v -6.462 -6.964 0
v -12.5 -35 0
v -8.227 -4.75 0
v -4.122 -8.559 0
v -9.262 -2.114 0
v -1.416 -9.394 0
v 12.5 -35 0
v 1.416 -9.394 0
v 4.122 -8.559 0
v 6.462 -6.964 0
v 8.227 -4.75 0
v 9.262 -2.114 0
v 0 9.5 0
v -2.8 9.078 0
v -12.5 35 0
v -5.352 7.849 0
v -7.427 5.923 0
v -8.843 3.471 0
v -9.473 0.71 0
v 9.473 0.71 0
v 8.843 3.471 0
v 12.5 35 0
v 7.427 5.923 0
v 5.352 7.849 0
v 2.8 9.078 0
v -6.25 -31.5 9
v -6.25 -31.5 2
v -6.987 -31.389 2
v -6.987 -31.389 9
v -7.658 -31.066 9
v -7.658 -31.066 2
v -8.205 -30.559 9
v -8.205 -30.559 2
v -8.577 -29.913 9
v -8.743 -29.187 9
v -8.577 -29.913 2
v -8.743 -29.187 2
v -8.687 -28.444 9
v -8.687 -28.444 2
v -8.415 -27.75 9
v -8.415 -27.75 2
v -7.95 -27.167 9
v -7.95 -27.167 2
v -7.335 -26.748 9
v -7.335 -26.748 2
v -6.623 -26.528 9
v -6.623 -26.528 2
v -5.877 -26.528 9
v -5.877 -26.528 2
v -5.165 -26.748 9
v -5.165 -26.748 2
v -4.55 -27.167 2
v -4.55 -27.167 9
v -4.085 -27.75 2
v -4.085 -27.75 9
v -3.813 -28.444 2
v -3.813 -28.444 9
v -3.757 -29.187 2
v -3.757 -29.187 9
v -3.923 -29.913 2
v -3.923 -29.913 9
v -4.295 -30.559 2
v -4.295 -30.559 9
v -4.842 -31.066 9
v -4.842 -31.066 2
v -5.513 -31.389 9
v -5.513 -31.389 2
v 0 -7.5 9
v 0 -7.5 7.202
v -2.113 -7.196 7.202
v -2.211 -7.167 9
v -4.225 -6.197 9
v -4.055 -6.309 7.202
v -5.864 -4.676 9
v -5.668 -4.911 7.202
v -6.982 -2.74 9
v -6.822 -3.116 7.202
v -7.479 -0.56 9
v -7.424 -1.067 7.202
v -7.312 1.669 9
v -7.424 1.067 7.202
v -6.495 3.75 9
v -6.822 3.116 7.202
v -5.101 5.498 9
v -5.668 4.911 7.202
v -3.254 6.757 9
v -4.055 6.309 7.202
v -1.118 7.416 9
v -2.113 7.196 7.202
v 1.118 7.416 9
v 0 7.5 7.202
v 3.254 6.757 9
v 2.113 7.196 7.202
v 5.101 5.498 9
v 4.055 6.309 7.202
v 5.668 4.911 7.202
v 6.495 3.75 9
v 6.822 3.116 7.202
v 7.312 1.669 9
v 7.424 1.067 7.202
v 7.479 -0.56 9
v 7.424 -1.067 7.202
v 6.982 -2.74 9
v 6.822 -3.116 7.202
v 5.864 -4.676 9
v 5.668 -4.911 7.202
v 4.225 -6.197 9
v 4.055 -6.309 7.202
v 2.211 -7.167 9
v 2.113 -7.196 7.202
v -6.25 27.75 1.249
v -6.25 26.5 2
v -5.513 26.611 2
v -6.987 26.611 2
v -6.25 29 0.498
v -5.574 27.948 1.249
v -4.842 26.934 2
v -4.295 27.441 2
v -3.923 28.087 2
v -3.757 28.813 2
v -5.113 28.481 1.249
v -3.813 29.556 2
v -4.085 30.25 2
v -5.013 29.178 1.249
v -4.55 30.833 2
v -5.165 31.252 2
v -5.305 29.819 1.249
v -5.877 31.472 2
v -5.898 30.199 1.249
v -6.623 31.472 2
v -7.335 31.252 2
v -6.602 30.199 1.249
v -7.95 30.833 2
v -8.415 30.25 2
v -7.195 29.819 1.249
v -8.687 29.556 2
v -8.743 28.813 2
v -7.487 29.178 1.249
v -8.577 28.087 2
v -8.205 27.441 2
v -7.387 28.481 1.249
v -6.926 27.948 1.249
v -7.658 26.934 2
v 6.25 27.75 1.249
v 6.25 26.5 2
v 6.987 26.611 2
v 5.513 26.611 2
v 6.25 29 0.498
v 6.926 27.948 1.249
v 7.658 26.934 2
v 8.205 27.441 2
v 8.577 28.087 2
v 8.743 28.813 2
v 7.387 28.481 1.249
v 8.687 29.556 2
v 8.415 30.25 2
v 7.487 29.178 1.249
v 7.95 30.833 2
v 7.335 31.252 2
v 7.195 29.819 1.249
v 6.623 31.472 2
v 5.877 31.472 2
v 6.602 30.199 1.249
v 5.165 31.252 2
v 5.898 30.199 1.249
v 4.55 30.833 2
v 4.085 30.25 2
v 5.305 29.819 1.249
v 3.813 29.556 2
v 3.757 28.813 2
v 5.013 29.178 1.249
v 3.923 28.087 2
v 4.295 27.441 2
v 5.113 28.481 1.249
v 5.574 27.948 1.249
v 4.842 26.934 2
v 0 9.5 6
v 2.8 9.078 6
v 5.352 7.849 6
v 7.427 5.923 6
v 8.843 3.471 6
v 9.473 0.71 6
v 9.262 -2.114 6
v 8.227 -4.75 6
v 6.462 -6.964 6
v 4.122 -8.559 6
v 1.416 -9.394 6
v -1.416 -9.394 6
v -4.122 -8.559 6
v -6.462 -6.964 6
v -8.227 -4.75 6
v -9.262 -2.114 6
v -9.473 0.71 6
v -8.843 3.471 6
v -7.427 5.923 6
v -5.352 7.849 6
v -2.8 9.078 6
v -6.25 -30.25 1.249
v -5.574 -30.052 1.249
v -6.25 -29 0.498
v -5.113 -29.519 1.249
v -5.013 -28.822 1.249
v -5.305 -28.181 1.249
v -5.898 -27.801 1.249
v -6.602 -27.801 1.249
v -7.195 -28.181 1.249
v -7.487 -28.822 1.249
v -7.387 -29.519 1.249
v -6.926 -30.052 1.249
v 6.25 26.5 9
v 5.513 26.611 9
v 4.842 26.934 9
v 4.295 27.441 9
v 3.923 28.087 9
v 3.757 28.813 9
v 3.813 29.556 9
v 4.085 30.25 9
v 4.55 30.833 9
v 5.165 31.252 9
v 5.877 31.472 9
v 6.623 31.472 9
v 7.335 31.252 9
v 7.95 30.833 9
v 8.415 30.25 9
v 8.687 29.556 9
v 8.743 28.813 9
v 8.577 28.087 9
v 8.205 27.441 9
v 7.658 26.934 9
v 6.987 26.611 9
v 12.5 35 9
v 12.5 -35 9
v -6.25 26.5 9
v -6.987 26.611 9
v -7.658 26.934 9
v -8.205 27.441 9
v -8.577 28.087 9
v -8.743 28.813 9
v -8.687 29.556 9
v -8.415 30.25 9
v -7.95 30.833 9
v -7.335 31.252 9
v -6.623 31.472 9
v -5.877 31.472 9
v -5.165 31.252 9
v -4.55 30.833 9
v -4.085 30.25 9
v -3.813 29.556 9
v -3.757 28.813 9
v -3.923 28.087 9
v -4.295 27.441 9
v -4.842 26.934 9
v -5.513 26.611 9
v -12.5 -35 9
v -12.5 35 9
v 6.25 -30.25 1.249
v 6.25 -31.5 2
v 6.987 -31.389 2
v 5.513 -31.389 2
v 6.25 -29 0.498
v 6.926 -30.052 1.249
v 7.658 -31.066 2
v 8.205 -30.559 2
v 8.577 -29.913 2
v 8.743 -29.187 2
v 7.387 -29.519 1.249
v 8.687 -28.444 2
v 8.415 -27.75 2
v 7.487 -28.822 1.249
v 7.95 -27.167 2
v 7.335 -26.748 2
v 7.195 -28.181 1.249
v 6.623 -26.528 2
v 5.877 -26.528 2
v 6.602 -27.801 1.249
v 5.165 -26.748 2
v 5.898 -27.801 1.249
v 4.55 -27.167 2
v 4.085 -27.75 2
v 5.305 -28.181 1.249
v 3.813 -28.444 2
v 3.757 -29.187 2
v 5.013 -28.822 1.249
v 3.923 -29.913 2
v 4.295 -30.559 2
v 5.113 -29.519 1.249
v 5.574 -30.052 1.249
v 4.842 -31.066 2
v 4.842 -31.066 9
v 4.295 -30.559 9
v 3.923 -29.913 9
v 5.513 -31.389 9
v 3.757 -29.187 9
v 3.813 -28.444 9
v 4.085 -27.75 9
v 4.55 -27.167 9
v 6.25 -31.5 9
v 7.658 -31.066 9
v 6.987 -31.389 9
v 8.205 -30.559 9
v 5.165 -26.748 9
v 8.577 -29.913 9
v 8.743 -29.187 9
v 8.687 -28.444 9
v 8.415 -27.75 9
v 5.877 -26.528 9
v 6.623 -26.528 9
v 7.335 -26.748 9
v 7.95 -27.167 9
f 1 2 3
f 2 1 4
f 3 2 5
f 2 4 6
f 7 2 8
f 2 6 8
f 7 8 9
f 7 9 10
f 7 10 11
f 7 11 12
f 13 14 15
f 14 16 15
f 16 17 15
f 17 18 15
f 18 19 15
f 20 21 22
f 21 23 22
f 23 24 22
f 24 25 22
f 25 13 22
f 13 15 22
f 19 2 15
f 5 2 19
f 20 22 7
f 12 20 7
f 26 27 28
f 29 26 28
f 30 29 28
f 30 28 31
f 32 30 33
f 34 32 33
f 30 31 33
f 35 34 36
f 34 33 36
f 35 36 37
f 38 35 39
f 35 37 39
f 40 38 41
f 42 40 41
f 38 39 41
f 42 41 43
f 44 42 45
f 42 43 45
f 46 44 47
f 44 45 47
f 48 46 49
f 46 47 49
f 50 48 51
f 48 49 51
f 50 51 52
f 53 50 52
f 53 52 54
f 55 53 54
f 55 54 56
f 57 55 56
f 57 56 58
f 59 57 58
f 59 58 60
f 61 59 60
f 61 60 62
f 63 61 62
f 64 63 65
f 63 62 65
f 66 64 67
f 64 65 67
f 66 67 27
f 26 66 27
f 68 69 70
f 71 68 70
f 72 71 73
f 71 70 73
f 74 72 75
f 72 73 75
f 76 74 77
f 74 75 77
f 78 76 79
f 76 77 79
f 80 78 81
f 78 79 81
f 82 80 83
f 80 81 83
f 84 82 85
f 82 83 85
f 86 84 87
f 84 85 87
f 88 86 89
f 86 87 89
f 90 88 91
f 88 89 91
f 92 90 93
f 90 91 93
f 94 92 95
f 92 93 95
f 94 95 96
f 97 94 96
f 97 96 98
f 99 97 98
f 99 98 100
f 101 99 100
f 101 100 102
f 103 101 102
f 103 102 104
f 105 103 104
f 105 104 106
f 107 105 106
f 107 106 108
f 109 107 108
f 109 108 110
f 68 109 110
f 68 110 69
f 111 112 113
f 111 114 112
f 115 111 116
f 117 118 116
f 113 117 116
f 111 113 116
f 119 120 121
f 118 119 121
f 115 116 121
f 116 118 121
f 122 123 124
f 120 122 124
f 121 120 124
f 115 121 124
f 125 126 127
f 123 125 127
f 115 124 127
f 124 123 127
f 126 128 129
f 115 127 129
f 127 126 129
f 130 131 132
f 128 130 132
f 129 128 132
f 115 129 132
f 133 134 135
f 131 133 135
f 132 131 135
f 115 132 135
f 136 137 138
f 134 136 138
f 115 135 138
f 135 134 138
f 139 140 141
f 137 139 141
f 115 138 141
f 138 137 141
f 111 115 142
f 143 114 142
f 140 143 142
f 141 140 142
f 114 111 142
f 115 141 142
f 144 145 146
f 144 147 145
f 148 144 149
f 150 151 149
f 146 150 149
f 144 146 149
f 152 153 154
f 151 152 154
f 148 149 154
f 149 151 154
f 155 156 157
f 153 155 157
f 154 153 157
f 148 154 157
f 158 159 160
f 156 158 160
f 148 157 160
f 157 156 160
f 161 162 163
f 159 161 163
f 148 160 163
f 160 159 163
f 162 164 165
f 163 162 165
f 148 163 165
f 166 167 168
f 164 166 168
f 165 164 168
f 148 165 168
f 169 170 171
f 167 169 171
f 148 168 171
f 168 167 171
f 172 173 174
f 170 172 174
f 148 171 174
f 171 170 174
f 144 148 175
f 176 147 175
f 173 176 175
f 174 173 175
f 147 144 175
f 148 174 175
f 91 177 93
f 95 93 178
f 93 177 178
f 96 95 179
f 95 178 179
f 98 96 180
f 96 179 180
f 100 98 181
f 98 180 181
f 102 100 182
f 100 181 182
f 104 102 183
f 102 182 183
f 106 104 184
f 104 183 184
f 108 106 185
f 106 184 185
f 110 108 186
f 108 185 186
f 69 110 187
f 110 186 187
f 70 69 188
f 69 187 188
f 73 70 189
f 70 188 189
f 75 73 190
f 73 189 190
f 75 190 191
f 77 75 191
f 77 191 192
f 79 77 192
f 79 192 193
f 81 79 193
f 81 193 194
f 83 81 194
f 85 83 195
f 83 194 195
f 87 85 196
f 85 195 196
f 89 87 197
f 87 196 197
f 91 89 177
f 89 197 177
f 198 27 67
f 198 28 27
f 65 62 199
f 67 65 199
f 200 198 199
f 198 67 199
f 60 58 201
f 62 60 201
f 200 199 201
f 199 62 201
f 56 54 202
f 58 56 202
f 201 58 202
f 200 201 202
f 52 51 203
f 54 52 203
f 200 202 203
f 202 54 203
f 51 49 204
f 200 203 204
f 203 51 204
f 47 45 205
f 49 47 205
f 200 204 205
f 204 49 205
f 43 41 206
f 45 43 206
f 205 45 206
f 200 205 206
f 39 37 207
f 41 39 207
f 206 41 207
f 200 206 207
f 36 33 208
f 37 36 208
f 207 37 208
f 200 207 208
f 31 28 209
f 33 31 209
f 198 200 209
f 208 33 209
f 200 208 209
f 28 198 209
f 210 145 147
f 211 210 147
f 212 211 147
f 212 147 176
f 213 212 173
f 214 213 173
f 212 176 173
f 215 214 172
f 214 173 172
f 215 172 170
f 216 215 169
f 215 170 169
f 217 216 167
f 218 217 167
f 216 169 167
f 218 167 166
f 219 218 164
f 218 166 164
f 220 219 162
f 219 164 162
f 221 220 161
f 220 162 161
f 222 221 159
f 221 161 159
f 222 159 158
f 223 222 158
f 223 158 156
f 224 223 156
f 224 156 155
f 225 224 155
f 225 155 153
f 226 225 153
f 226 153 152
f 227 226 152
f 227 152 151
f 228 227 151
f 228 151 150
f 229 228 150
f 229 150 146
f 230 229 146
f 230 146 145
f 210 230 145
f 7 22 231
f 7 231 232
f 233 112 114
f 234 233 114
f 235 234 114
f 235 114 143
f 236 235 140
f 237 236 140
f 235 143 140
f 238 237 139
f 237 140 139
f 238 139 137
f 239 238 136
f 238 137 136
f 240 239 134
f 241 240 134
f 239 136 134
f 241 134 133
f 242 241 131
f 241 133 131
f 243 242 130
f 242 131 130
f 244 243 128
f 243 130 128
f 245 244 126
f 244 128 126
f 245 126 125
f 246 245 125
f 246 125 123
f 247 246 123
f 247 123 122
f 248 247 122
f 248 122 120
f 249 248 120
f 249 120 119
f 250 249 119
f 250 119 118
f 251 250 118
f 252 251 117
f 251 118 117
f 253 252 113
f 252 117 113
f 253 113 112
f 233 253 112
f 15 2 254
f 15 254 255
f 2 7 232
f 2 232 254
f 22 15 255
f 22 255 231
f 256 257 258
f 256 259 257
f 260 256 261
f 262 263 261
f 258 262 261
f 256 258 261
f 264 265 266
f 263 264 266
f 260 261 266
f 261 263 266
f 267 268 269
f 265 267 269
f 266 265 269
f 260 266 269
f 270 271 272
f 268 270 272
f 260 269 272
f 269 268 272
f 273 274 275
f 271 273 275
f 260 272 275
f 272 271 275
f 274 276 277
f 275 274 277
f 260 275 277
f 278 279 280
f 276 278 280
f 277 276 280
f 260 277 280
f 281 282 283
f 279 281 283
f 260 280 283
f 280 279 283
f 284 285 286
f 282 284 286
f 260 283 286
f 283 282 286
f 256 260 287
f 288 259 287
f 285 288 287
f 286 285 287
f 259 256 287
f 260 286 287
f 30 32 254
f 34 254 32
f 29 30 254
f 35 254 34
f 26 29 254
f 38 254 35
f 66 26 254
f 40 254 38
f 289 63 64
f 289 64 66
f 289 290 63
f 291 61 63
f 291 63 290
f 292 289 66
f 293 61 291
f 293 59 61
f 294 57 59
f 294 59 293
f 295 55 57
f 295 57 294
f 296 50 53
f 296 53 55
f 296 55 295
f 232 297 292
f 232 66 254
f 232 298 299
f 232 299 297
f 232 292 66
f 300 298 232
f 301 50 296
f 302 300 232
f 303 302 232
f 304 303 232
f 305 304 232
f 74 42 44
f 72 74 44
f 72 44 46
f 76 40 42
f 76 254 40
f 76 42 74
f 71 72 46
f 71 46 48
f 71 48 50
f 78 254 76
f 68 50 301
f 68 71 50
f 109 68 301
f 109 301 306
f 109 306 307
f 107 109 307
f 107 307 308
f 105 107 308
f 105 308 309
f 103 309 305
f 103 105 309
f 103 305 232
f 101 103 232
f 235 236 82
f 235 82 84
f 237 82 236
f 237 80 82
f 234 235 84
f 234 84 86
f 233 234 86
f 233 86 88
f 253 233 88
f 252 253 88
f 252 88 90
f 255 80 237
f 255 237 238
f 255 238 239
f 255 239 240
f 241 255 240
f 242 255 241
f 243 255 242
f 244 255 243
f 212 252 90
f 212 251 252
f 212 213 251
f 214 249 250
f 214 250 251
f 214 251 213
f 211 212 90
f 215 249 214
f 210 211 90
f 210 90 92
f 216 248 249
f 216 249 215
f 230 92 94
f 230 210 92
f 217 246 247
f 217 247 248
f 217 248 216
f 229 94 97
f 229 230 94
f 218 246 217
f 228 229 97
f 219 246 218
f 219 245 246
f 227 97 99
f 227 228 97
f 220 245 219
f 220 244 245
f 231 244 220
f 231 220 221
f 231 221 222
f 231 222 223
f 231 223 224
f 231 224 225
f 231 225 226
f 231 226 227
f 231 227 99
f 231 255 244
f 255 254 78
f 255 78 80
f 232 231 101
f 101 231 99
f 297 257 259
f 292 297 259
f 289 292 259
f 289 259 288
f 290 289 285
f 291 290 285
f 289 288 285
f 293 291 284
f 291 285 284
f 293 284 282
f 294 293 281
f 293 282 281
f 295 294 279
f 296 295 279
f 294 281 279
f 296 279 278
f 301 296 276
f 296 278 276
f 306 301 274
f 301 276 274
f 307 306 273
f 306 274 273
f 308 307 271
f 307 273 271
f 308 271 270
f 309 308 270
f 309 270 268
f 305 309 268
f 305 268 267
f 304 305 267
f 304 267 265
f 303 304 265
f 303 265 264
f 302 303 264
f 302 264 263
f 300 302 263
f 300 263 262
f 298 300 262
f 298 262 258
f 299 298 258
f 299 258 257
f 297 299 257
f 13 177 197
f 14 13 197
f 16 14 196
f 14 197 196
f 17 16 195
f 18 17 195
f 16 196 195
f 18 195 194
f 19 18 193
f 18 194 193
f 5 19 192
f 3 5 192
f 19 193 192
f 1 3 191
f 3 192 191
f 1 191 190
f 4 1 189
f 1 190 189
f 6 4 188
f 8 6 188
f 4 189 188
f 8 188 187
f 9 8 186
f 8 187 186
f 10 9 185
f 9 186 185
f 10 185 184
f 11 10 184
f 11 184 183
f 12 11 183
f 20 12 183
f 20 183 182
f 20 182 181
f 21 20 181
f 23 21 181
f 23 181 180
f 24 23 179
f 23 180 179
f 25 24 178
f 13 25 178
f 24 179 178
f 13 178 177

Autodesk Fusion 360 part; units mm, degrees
sketch "Sketch1" plane through (0, 0, 0) normal (0, 0, 1) x (1, 0, 0)
  line L0 (12.5, -35) -> (-12.5, -35)
  line L1 (-12.5, -35) -> (-12.5, 35)
  line L2 (-12.5, 35) -> (12.5, 35)
  line L3 (12.5, 35) -> (12.5, -35)
  dimension "d1" = 70
  dimension "d2" = 25
  dimension "d3" = 12.5
  dimension "d4" = 35
extrude "Extrude1" add sketch "Sketch1" along normal blind 9
sketch "Sketch2" plane through (0, 0, 9) normal (0, 0, 1) x (-1, 0, 0)
  line L0 (-12.5, -35) -> (12.5, -35)
  line L1 (12.5, -35) -> (12.5, 35)
  line L2 (12.5, 35) -> (-12.5, 35)
  line L3 (-12.5, 35) -> (-12.5, -35)
  circle A0 centre (0, 0) radius 7.5
  line L4 (0, 0) -> (0, -29) construction
  line L5 (0, -29) -> (6.25, -29)
  circle A1 centre (6.25, -29) radius 2.5
  circle A2 centre (-6.25, -29) radius 2.5
  circle A3 centre (6.25, 29) radius 2.5
  circle A4 centre (-6.25, 29) radius 2.5
  dimension "d7" = 15
  dimension "d8" = 29
  dimension "d9" = 6.25
  dimension "d10" = 5
  dimension "d11" = 29
  dimension "d12" = 12.5
  dimension "d13" = 29
  dimension "d14" = 58
  dimension "d15" = 5
  dimension "d16" = 5
hole "Hole1" at (0, 0, 9) direction (0, 0, -1) diameter 15 depth 3 tip angle 118
hole "Hole2" at (-6.25, -29, 9) at (6.25, -29, 9) at (6.25, 29, 9) at (-6.25, 29, 9) direction (0, 0, -1) diameter 5 depth 7 tip angle 118
sketch "Sketch3" plane through (0, 0, 0) normal (0, 0, -1) x (1, 0, 0)
  line L0 (-12.5, -35) -> (12.5, -35)
  line L1 (12.5, -35) -> (12.5, 35)
  line L2 (12.5, 35) -> (-12.5, 35)
  line L3 (-12.5, 35) -> (-12.5, -35)
  circle A0 centre (0, 0) radius 9.5
  dimension "d23" = 19
hole "Hole3" at (0, 0, 0) direction (0, 0, 1) diameter 19 depth 6 tip angle 118
